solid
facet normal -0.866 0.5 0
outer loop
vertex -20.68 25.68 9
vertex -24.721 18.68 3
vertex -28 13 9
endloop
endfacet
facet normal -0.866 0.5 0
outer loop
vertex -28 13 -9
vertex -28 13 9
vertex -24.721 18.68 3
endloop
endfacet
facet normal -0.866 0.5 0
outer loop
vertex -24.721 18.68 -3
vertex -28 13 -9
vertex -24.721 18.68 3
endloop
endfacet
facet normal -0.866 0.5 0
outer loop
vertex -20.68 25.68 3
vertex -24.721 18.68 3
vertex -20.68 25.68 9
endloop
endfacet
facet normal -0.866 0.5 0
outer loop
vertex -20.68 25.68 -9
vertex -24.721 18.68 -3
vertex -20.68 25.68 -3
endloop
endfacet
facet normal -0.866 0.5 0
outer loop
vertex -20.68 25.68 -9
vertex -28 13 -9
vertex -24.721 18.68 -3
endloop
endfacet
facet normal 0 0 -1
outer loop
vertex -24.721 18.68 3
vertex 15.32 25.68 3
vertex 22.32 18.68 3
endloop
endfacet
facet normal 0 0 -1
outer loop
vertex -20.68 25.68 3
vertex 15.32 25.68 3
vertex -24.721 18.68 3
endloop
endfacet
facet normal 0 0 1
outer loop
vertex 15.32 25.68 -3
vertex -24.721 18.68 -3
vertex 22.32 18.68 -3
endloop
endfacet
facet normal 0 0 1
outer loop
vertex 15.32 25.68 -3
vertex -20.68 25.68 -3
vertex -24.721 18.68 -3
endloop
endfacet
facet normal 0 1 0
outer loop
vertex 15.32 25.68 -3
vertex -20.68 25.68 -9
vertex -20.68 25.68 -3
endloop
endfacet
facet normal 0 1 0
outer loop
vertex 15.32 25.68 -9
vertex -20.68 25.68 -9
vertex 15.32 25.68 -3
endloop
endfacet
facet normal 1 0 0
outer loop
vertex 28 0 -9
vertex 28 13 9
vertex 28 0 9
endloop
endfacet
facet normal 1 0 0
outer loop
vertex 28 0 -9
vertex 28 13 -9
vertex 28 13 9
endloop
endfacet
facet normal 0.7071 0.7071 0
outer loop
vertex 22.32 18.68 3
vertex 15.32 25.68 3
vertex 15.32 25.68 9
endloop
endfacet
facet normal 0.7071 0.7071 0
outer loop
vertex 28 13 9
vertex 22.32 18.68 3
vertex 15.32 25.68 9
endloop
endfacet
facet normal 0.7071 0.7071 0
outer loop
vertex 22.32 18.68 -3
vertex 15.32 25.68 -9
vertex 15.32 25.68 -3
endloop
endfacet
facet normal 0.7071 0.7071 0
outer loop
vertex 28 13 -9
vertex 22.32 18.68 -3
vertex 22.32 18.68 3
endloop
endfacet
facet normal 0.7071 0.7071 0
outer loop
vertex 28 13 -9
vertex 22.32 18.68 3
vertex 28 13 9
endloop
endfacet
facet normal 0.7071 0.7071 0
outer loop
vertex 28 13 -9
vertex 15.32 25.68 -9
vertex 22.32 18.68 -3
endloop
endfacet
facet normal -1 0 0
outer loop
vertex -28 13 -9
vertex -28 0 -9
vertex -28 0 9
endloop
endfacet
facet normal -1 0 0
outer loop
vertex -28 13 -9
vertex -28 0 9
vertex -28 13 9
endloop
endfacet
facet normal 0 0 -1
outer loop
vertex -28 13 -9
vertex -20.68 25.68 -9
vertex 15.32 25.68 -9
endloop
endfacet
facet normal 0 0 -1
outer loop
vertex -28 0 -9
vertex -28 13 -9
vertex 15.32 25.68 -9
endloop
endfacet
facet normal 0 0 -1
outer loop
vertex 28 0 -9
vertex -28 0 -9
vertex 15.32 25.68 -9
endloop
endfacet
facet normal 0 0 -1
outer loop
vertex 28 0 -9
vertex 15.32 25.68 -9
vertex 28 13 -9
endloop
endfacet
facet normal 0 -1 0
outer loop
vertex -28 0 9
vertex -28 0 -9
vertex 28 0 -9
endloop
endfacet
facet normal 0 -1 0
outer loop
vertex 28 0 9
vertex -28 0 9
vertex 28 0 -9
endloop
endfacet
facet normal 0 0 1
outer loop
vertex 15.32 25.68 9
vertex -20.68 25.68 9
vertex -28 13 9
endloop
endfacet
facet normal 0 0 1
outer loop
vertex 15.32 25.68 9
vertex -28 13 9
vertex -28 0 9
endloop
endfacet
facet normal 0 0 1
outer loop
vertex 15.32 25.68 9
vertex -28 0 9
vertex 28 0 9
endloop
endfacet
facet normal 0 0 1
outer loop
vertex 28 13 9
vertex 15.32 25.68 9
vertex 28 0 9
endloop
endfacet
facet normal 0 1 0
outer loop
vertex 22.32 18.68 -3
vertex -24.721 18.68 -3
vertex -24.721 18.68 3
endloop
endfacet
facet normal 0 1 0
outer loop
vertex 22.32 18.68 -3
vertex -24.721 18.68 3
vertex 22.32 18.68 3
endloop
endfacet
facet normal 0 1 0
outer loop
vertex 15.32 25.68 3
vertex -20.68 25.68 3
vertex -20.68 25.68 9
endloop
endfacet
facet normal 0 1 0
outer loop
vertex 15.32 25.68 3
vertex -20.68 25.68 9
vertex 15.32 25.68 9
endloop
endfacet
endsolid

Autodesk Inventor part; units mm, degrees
ref_plane "YZ Plane" through (0, 0, 0) normal (1, 0, 0) x (0, 1, 0)
ref_plane "XZ Plane" through (0, 0, 0) normal (0, 1, 0) x (-1, 0, 0)
ref_plane "XY Plane" through (0, 0, 0) normal (0, 0, 1) x (1, 0, 0)
sketch "Boceto1" plane through (0, 0, 0) normal (0, 0, 1) x (1, 0, 0)
  line L0 (-28, 0) -> (28, 0)
  line L1 (-28, 0) -> (-28, 13)
  line L2 (-28, 13) -> (-20.6795, 25.6795)
  line L3 (-20.6795, 25.6795) -> (15.3205, 25.6795)
  line L4 (15.3205, 25.6795) -> (28, 13)
  line L5 (28, 13) -> (28, 0)
  line L6 (15.3205, 25.6795) -> (15.3205, 18.6795)
  line L7 (-24.7209, 18.6795) -> (22.3205, 18.6795) construction
  point P0 (0, 0)
  dimension "d0" = 28
  dimension "d1" = 28
  dimension "d2" = 13
  dimension "d3" = 36
  dimension "d4" = 135
  dimension "d6" = 7
  dimension "d16" = 150
extrude "Extrusión1" add sketch "Boceto1" along normal mid plane 18
sketch "Boceto2" plane through (-20.6795, 25.6795, 9) normal (0, 1, 0) x (1, 0, 0)
  line L0 (-7.3205, 18) -> (-7.3205, 0) construction
  line L1 (-7.3205, 12) -> (48.6795, 12) construction
  line L2 (48.6795, 18) -> (48.6795, 0) construction
  line L3 (-7.3205, 6) -> (48.6795, 6) construction
  line L4 (0, 18) -> (36, 18) construction
  line L5 (-4.0415, 12) -> (-4.0415, 6)
  line L6 (43, 12) -> (43, 6)
  line L7 (-4.0415, 12) -> (43, 12)
  line L8 (43, 6) -> (-4.0415, 6)
  point P0 (20.6795, 9)
  point P1 (-4.0415, 9)
  point P2 (43, 9)
  dimension "d9" = 6
  dimension "d10" = 6
extrude "Extrusión2" cut sketch "Boceto2" against normal blind 7
